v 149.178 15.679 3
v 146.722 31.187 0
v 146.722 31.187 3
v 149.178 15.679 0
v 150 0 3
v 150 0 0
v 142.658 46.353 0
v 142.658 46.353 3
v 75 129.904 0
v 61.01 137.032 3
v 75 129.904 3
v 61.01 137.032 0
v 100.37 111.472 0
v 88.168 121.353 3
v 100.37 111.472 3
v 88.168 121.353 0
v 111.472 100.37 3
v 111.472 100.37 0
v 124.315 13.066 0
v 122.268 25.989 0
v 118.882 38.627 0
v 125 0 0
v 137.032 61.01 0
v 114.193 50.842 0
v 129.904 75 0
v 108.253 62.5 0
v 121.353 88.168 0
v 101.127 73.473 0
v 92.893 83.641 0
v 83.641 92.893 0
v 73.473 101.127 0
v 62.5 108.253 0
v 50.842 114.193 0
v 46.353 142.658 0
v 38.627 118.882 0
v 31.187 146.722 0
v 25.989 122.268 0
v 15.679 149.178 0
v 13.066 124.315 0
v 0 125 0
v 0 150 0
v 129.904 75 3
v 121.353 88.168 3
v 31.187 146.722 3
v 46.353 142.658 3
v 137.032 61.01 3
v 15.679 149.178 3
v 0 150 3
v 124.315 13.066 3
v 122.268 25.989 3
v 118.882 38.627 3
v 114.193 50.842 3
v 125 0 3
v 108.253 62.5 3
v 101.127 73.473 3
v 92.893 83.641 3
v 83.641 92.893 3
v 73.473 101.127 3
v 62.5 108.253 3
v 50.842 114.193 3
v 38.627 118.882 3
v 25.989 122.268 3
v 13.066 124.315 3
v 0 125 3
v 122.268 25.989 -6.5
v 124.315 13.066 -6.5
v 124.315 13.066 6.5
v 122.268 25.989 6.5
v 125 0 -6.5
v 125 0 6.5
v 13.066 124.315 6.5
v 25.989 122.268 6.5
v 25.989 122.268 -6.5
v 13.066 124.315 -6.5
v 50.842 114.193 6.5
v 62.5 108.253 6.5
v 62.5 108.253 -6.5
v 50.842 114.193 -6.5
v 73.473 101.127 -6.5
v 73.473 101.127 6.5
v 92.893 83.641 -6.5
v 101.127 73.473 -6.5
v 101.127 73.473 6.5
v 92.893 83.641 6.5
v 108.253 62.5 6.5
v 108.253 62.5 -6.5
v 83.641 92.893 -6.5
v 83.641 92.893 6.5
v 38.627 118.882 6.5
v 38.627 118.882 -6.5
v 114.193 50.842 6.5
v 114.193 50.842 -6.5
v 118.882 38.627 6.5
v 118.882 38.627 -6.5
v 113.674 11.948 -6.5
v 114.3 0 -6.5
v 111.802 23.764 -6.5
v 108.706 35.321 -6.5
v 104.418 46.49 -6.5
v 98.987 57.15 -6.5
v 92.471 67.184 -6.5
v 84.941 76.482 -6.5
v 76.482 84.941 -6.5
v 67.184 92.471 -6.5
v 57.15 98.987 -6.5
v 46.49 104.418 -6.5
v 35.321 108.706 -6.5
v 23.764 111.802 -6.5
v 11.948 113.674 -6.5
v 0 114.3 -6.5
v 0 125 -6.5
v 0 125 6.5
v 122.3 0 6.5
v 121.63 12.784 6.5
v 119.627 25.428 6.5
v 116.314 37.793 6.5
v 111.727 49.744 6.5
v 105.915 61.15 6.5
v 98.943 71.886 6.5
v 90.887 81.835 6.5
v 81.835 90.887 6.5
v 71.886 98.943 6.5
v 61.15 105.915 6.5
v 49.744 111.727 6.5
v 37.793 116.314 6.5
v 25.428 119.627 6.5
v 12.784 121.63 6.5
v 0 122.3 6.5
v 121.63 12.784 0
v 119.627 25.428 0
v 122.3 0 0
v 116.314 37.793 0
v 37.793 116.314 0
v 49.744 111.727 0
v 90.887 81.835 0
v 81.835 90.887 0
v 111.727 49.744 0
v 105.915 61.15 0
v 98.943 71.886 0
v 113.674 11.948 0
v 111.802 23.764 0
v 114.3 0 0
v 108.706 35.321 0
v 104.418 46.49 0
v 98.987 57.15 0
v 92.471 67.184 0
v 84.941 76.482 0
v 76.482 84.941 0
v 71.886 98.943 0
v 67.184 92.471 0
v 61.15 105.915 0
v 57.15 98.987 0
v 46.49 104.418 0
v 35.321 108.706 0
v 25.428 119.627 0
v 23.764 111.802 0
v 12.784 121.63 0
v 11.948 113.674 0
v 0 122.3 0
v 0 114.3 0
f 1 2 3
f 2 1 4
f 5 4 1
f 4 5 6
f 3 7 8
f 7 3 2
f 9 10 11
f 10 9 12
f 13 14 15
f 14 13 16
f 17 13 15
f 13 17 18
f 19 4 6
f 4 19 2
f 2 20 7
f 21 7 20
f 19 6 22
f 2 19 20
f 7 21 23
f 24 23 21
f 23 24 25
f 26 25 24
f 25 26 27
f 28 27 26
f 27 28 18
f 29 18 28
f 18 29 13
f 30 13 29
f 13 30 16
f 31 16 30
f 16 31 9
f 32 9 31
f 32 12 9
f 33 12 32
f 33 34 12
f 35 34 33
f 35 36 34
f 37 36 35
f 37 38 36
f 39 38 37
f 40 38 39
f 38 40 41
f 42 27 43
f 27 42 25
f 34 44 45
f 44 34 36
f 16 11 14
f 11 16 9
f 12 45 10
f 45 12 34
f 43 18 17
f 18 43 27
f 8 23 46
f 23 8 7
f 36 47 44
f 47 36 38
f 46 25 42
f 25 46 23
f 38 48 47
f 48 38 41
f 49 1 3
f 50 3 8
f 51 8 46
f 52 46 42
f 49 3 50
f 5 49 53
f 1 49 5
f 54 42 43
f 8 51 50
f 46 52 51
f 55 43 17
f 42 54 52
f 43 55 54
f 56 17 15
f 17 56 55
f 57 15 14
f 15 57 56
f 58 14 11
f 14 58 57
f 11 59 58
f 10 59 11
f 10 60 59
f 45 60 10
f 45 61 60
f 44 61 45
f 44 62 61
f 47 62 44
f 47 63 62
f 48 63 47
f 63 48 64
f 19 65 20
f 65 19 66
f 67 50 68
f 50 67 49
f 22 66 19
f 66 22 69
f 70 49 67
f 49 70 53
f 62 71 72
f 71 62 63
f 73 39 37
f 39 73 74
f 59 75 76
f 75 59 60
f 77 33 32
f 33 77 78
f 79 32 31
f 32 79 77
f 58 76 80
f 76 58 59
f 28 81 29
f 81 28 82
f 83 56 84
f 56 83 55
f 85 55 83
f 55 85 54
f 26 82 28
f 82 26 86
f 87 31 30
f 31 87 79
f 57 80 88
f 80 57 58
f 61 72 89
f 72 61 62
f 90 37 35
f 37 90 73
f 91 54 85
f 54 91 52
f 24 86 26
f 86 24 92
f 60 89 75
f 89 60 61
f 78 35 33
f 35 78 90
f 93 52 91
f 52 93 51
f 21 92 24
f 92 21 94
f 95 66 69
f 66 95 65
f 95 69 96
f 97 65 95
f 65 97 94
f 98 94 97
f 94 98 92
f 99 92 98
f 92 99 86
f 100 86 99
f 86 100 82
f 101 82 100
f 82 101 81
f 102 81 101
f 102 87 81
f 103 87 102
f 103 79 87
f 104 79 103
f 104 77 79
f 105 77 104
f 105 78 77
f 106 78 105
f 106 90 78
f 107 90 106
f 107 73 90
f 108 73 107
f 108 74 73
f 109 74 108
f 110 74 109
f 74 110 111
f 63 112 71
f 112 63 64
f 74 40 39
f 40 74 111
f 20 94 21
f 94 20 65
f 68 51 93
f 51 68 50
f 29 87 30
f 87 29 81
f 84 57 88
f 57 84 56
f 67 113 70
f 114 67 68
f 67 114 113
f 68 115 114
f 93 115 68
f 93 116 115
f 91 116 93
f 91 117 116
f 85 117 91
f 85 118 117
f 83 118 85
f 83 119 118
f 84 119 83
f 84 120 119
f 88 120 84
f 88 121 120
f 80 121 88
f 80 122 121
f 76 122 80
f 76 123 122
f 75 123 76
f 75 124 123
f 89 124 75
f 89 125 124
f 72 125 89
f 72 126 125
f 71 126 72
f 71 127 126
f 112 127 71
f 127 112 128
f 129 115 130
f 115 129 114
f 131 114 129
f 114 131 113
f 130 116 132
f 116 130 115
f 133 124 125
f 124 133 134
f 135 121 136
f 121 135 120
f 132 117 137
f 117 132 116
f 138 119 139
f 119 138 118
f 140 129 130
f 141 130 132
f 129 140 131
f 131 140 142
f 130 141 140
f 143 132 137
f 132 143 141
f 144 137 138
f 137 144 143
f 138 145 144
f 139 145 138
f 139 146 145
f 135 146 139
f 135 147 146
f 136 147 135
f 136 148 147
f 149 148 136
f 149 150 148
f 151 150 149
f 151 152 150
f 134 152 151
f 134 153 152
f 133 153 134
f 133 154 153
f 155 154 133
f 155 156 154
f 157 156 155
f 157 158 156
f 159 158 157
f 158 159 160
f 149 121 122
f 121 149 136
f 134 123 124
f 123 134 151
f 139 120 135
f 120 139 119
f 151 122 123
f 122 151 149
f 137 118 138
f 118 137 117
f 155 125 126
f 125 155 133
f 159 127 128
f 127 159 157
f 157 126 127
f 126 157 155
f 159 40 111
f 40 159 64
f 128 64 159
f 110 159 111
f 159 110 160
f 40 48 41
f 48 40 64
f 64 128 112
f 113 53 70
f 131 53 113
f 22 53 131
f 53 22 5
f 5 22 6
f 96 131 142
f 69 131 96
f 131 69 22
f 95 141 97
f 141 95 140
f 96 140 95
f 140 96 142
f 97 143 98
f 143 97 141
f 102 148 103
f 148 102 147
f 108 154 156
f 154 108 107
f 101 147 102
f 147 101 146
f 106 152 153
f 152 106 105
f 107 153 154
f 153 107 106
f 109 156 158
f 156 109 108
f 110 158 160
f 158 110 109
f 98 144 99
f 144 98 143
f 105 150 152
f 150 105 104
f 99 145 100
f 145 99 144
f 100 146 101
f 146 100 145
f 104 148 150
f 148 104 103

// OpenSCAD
$fn = 60;

difference(){
	intersection() {
		difference() {
			union() {
				cylinder(h = 3, r = 150);
				translate(v = [0, 0, -6.5000000000]) {
					difference() {
						cylinder(h = 13, r = 125);
					}
				}
			}
			cylinder(h = 10, r = 122.3000000000);
		}
		translate(v = [0, 0, -6.5000000000]) {
			cube(center = 50, size = 150);
		}
	}
	/* Holes Below*/
	intersection(){
		difference(){
			union(){
				translate(v = [0, 0, -6.5000000000]){
					difference(){
						cylinder(h = 13, r = 114.3000000000);
					}
				}
			}
		}
	} /* End Holes */ 
}
/***********************************************
*********      SolidPython code:      **********
************************************************
 
#! /usr/bin/env python
# -*- coding: utf-8 -*-
from __future__ import division
import os
import sys

# Assumes SolidPython is in site-packages or elsewhwere in sys.path
from solid import *
from solid.utils import *

SEGMENTS = 60

def assembly():
    outer_sleeve_height = 13
    outer_sleeve_radius = 125
    inner_sleeve_radius = 114.3
    distance_from_outside_to_brace = 8
    top_thickness = 10

    outer = cylinder(outer_sleeve_radius, outer_sleeve_height)
    inner = cylinder(inner_sleeve_radius, outer_sleeve_height)
    lip = cylinder(inner_sleeve_radius + distance_from_outside_to_brace, top_thickness)
    cover_sleeve = outer - hole()(inner)
    cover_sleeve_with_lip = cover_sleeve - lip

    return cover_sleeve_with_lip * cube(outer_sleeve_radius, outer_sleeve_height)

def assembly_2():
    outer_sleeve_height = 13
    outer_sleeve_radius = 125
    inner_sleeve_radius = 114.3
    distance_from_outside_to_brace = 8
    top_thickness = 10

    base = cylinder(outer_sleeve_radius + 25, outer_sleeve_height - 10)
    lid_holder = cylinder(outer_sleeve_radius, outer_sleeve_height) - hole()(cylinder(inner_sleeve_radius, outer_sleeve_height))
    lip = cylinder(inner_sleeve_radius + distance_from_outside_to_brace, top_thickness)
    return ((base + down(outer_sleeve_height / 2)(lid_holder)) - lip) * down(outer_sleeve_height / 2)(cube(outer_sleeve_radius + 25, 50))

if __name__ == '__main__':
    a = assembly_2()
    scad_render_to_file(a, file_header='$fn = %s;' % SEGMENTS, include_orig_code=True)
 
 
************************************************/
